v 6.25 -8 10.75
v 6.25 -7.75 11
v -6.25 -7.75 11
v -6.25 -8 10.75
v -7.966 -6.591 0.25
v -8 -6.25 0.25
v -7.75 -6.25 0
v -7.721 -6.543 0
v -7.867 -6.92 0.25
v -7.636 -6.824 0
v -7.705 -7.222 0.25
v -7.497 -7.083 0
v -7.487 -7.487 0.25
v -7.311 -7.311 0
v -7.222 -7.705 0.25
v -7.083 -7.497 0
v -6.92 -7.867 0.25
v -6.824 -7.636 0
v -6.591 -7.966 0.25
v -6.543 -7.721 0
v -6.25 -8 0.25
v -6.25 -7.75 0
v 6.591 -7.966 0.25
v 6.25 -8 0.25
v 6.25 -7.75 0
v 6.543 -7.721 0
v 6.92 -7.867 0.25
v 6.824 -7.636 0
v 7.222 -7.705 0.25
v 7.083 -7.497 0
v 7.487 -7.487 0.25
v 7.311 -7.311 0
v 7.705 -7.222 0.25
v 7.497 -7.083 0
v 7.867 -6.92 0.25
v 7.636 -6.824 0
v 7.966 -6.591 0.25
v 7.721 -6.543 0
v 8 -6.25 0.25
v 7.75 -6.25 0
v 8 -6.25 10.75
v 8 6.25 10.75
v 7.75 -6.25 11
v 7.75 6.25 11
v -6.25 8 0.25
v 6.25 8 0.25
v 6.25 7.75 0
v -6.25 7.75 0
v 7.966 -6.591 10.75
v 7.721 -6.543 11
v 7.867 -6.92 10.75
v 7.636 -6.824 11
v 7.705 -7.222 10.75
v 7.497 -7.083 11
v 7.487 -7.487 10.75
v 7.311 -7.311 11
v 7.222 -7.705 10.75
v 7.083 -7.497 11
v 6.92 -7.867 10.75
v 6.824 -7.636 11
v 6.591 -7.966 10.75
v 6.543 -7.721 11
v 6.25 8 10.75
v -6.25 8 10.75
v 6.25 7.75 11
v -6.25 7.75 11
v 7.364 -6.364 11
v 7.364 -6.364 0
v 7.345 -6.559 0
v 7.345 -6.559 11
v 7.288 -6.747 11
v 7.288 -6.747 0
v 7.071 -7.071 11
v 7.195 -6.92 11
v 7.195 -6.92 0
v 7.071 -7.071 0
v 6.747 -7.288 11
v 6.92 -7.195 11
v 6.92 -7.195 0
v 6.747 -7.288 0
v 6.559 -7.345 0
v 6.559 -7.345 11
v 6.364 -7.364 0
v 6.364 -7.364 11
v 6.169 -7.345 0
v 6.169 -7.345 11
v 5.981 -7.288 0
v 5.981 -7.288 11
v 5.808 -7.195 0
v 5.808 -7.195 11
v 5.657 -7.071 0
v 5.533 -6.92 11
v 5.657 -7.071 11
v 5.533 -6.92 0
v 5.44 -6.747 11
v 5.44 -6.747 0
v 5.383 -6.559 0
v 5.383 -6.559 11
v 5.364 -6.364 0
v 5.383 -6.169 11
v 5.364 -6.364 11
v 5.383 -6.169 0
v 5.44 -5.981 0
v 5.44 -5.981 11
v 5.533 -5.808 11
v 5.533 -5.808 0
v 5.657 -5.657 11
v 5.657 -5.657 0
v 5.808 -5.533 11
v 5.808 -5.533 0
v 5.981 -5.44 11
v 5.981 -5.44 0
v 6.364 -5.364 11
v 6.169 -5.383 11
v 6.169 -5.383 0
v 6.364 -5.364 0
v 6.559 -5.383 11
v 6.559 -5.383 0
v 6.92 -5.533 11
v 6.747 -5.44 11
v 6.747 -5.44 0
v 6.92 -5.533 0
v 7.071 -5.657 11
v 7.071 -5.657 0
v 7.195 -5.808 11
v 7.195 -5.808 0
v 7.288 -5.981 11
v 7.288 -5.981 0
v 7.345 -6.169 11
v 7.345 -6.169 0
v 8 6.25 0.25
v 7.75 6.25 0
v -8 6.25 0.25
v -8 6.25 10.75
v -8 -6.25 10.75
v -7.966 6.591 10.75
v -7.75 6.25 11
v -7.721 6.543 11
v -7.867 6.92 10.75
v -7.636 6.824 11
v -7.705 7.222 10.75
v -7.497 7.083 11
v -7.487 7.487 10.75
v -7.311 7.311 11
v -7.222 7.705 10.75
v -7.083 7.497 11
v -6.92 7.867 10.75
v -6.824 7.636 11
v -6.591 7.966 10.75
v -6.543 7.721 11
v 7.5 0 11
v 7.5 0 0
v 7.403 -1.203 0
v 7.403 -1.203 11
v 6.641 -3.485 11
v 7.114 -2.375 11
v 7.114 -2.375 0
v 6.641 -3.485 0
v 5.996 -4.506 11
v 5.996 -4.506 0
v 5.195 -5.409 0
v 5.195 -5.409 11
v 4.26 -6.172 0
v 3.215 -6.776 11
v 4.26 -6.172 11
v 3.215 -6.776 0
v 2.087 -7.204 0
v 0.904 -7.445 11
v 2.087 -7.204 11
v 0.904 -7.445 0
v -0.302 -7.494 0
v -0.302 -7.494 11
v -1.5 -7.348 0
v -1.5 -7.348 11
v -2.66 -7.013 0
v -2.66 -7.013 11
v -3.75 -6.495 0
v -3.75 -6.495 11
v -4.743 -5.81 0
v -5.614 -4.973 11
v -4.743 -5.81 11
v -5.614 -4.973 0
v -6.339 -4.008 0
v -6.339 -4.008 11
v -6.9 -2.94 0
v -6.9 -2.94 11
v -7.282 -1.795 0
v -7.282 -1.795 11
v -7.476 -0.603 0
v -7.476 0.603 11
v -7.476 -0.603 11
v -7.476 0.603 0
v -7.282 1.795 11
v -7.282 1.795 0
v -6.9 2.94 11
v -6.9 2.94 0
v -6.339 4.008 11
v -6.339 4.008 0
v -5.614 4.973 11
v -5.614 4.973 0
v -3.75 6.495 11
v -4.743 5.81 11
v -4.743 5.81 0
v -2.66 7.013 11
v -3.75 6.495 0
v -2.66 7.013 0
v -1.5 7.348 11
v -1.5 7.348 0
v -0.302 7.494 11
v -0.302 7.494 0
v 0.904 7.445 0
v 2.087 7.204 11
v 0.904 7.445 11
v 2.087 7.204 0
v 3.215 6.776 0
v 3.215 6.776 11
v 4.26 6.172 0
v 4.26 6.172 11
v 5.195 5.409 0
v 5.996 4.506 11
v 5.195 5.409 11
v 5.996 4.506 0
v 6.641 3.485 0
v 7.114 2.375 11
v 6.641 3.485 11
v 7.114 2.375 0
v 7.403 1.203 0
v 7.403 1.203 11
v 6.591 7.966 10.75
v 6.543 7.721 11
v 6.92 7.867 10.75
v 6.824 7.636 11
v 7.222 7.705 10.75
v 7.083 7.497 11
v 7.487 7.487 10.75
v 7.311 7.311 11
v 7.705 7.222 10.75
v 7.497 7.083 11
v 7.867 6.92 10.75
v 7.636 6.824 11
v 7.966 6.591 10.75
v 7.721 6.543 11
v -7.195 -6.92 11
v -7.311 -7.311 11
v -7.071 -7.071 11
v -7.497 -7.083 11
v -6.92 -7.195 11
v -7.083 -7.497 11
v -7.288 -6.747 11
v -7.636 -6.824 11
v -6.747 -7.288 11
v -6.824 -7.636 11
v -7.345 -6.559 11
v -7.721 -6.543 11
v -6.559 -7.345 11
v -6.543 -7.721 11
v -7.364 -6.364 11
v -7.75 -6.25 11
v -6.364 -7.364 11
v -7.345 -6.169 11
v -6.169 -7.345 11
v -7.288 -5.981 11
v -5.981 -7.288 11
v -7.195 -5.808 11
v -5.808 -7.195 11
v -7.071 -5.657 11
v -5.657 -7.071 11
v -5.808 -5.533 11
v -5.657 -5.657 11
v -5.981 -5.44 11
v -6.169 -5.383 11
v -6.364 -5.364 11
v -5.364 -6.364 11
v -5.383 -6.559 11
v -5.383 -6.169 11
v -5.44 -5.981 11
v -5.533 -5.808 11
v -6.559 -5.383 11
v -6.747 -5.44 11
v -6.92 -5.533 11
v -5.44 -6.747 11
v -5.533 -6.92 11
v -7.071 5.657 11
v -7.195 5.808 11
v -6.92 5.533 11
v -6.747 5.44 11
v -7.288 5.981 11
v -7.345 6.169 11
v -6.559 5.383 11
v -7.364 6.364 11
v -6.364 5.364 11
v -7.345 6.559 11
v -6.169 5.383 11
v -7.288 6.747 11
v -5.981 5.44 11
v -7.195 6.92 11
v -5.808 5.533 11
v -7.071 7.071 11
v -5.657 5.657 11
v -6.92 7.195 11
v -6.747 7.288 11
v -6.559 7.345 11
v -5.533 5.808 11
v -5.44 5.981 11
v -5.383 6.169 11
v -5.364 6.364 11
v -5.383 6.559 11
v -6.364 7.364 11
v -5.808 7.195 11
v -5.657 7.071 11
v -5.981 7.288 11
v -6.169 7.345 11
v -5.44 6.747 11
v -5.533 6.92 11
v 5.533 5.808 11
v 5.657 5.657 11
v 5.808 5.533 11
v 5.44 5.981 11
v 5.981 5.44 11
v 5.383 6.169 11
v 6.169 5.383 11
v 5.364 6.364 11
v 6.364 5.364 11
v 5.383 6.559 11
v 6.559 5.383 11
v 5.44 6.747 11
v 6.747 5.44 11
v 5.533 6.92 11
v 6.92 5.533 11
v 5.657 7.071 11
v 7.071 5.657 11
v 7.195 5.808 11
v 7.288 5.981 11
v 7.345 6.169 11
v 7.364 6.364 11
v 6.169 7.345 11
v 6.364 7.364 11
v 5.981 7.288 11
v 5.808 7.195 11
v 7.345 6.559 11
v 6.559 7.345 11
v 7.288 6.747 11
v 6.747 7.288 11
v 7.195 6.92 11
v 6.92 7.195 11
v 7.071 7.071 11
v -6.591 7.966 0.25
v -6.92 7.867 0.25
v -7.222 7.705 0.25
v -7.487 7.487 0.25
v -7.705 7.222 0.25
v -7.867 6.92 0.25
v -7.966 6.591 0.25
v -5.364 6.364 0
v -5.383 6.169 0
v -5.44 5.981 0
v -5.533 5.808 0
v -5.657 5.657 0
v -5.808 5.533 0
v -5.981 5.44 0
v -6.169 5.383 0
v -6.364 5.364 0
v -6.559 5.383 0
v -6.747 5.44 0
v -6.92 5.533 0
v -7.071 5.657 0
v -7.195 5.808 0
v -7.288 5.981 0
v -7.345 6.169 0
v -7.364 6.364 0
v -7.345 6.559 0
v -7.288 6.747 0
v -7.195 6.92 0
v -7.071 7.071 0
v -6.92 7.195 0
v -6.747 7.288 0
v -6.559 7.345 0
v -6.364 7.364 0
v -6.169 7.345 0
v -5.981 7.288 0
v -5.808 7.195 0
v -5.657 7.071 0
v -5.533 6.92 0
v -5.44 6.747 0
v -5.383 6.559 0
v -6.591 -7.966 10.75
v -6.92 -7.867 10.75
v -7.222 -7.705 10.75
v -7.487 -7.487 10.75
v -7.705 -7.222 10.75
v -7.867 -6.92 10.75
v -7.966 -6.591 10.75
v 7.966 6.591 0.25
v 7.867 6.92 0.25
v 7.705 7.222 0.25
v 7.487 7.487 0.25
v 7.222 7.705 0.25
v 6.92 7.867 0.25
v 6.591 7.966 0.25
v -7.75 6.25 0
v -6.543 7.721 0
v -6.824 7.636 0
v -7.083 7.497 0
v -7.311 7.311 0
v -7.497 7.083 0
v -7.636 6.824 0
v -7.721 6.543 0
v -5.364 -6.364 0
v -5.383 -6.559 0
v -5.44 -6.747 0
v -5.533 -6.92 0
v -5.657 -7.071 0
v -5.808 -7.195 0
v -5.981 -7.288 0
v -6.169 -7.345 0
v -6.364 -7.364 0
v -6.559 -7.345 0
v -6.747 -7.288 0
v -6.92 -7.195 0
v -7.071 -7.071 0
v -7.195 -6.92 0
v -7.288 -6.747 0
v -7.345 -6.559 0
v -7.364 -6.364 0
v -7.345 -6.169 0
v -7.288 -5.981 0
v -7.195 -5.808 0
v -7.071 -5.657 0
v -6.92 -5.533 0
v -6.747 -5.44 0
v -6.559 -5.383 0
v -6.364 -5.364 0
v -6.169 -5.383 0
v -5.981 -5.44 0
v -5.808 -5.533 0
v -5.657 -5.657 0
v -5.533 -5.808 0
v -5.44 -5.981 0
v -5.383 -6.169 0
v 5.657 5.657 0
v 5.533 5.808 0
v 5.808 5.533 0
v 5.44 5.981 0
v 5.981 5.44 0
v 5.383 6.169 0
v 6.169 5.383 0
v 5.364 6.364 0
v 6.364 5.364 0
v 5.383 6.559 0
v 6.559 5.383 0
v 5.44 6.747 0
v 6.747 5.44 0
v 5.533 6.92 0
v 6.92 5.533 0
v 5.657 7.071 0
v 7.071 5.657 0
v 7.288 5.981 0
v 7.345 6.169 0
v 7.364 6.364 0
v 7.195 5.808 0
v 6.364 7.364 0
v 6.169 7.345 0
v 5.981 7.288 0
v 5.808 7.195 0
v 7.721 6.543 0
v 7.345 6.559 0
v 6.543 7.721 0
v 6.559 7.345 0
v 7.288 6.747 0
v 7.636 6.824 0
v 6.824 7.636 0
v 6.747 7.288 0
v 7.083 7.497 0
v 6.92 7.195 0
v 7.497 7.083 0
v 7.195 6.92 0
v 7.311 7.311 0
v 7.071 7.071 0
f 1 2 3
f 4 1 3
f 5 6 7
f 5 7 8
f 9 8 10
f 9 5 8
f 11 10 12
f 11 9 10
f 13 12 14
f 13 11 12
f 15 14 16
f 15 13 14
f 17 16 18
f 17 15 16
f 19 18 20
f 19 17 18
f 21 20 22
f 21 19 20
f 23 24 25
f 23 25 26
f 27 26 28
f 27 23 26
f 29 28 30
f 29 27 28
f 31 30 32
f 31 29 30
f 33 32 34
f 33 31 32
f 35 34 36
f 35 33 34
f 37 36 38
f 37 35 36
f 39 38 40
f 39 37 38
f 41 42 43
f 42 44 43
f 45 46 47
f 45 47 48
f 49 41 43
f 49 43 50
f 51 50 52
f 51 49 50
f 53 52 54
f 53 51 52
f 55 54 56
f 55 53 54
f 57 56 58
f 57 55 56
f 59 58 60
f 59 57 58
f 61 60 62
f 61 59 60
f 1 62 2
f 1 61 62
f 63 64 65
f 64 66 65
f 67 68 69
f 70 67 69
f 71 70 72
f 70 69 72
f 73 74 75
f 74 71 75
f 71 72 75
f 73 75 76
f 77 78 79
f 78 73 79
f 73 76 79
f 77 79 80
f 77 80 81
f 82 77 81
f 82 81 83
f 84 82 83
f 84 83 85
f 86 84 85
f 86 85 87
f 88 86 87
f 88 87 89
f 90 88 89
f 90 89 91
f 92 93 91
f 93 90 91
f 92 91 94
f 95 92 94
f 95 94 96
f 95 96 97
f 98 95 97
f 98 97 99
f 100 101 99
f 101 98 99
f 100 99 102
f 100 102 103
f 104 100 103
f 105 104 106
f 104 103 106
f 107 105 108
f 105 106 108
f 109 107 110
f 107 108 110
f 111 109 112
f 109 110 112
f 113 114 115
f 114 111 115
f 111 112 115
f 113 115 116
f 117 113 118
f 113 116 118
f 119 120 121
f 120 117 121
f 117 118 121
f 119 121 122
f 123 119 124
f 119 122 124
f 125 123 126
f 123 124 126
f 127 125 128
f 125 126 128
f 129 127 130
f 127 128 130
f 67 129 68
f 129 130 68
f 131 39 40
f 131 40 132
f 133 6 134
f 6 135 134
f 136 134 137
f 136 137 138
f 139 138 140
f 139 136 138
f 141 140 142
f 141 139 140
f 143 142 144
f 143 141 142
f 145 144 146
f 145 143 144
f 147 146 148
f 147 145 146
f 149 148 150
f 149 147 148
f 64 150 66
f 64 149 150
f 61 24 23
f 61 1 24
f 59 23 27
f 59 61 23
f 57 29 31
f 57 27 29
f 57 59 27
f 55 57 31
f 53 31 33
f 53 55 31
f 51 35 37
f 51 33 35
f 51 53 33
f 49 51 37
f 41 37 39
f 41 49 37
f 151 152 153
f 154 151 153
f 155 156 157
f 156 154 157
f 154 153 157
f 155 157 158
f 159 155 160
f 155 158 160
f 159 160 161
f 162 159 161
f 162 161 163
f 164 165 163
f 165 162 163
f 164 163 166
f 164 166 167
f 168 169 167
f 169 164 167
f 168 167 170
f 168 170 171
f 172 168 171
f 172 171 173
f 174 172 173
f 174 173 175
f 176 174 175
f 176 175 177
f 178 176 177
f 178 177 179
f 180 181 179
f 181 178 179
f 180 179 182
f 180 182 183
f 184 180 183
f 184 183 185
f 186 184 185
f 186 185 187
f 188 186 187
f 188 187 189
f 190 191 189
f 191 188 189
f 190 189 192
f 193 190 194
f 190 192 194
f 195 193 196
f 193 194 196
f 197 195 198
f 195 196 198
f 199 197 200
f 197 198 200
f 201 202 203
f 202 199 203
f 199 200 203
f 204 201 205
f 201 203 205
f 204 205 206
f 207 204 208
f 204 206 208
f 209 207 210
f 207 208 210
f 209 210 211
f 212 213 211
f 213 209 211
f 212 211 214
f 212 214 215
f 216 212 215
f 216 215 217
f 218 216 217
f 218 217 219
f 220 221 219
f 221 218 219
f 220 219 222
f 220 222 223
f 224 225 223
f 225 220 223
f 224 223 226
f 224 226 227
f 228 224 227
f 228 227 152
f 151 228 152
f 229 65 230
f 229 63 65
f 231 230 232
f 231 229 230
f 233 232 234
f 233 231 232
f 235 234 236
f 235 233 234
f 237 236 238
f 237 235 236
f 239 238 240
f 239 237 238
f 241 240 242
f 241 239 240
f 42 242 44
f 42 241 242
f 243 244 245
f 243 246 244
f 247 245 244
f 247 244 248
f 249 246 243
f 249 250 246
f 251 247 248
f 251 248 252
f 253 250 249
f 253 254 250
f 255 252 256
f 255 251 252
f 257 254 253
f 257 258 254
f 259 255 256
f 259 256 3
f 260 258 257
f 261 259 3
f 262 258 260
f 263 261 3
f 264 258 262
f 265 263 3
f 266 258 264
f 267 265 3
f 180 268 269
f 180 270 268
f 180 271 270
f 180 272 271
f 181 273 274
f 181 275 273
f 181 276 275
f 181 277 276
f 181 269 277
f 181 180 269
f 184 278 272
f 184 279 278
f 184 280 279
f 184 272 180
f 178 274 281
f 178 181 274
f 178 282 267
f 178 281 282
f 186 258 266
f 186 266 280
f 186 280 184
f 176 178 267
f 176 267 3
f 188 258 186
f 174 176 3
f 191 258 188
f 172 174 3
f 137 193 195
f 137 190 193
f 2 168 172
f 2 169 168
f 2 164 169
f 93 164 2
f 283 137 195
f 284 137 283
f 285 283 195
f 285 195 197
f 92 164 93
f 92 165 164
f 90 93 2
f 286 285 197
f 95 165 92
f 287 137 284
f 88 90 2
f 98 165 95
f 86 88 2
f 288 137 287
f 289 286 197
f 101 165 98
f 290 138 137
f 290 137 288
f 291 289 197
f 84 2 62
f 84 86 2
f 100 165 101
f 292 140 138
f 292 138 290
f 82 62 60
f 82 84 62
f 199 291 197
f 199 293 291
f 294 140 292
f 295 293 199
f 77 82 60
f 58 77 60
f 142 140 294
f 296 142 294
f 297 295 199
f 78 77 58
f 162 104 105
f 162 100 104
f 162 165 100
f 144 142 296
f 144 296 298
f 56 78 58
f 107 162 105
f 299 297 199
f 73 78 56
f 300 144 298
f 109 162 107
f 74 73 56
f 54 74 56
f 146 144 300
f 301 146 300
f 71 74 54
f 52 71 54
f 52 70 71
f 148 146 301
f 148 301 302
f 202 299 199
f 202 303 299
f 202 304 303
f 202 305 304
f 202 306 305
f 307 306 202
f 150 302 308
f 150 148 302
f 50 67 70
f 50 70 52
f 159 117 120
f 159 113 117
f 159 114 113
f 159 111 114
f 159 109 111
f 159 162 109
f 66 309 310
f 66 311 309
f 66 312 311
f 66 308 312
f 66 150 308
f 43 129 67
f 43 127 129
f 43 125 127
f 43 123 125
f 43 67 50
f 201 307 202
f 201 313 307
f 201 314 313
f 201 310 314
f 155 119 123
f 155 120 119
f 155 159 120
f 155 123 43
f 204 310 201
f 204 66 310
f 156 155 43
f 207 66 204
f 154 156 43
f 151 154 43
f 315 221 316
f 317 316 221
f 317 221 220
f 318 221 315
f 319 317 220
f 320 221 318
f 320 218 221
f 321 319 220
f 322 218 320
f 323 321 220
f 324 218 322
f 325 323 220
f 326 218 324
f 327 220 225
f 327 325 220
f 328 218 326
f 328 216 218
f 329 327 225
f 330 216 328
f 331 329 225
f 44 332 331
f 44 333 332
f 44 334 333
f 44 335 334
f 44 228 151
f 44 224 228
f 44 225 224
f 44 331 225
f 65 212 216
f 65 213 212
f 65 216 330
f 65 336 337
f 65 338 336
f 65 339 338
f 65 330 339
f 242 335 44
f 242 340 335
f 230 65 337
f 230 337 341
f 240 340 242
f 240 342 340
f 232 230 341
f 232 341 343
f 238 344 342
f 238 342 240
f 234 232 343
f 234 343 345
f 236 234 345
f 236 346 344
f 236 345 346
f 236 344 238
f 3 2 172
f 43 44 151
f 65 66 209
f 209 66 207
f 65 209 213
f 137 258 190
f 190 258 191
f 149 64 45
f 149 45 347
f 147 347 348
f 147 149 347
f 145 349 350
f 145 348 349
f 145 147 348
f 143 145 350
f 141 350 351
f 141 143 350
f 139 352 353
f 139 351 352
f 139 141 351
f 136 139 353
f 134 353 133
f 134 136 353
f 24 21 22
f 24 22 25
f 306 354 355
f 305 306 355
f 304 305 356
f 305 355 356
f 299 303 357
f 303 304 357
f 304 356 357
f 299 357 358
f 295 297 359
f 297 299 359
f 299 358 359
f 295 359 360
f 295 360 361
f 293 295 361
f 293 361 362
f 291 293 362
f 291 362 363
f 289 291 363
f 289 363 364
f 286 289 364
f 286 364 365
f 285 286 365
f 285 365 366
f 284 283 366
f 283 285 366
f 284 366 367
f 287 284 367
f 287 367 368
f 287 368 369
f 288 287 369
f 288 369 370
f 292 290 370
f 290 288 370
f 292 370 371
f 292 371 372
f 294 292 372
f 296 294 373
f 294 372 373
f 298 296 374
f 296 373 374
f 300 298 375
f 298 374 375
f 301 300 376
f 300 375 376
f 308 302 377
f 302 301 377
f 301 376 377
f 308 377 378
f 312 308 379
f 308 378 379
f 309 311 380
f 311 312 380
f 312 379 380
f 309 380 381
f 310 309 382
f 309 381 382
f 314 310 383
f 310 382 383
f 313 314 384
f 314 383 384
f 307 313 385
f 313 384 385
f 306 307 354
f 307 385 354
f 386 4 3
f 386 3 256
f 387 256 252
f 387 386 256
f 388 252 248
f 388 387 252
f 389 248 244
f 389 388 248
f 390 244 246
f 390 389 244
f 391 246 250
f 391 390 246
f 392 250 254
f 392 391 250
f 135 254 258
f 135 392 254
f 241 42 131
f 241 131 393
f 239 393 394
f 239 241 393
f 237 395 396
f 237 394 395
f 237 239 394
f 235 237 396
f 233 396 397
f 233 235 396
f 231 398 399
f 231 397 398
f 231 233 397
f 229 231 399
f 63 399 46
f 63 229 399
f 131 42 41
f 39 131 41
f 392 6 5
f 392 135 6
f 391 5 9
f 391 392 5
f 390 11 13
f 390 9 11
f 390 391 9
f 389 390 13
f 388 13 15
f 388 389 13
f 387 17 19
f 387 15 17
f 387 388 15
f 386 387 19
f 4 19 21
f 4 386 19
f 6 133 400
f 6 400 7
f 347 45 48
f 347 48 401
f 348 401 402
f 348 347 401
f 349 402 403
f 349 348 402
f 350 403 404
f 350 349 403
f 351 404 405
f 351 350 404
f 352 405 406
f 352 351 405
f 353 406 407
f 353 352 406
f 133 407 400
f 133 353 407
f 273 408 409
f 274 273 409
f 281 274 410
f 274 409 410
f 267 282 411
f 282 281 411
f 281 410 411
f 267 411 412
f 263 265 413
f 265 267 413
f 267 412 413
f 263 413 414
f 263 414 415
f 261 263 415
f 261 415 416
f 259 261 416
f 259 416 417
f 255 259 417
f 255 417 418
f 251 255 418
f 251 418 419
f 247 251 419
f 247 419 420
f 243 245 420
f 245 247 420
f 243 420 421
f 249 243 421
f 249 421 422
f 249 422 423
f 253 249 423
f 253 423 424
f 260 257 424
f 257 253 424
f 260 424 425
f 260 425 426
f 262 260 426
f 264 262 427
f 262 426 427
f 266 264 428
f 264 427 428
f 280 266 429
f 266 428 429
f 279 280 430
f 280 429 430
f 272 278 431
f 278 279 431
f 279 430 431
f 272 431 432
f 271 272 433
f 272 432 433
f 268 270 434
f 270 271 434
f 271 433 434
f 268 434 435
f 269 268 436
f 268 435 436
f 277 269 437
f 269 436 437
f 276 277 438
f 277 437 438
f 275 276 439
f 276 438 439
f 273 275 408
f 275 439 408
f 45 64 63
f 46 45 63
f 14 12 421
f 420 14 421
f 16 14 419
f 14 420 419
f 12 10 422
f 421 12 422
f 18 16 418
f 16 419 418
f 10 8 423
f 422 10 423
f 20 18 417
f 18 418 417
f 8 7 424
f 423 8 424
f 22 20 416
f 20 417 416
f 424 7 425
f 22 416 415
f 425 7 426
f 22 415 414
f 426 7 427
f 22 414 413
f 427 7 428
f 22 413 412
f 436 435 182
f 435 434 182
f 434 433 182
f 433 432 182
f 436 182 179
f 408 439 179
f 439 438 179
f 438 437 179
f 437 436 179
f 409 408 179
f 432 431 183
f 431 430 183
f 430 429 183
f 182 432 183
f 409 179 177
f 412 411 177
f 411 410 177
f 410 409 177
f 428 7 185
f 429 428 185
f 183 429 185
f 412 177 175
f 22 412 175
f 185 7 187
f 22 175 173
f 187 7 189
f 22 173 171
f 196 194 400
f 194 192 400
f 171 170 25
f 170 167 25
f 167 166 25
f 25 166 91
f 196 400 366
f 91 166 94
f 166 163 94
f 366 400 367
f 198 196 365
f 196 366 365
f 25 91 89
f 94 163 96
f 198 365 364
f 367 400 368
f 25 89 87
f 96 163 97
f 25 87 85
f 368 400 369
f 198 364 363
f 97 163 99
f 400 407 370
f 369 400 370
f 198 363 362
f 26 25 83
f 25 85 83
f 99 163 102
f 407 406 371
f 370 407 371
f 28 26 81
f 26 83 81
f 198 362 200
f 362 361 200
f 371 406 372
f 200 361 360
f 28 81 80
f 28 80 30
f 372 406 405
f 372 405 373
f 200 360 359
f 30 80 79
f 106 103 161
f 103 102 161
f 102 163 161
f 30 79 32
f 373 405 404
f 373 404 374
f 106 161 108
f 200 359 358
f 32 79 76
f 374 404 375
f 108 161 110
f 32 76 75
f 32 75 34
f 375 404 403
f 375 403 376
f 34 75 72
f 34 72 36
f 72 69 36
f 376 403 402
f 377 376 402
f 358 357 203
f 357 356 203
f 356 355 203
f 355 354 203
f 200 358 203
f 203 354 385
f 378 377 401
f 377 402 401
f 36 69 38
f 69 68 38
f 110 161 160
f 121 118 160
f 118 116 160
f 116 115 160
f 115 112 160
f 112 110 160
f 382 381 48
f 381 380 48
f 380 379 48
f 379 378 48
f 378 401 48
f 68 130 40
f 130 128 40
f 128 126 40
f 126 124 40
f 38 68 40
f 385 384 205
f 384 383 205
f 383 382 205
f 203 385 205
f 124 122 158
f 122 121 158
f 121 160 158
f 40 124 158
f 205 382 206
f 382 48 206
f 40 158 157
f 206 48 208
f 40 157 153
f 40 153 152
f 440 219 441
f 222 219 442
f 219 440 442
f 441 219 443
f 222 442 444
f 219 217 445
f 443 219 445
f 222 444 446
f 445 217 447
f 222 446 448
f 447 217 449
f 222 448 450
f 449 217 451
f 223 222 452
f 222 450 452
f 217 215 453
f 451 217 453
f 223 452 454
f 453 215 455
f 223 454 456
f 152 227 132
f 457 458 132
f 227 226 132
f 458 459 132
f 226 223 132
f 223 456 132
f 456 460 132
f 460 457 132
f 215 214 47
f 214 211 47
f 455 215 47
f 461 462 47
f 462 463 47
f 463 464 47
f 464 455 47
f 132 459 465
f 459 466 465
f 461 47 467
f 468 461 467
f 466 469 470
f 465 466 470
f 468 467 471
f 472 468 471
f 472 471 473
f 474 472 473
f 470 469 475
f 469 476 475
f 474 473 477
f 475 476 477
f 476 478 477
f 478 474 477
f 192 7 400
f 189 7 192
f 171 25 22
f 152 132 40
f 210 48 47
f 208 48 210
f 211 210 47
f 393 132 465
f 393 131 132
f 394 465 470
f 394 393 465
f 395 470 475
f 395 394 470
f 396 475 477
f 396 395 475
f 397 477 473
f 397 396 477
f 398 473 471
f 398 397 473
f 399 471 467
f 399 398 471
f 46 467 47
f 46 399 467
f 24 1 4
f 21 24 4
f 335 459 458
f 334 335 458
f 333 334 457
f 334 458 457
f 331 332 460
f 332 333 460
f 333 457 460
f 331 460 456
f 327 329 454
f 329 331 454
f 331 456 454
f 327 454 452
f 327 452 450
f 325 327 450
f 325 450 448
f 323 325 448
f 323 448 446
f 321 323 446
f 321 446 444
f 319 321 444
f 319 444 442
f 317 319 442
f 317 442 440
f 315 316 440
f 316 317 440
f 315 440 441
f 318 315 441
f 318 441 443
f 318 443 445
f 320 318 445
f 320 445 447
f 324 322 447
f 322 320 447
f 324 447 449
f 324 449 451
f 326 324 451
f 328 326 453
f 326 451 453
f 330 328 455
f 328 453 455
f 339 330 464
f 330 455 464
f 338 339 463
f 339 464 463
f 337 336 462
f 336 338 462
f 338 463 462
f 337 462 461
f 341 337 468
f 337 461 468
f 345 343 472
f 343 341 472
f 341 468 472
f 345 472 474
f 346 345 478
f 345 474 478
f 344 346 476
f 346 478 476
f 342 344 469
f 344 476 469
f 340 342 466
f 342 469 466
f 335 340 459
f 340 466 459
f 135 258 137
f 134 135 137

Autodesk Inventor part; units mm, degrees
ref_plane "YZ Plane" through (0, 0, 0) normal (1, 0, 0) x (0, 1, 0)
ref_plane "XZ Plane" through (0, 0, 0) normal (0, 1, 0) x (-1, 0, 0)
ref_plane "XY Plane" through (0, 0, 0) normal (0, 0, 1) x (1, 0, 0)
sketch "Sketch1" plane through (0, 0, 0) normal (0, 0, 1) x (1, 0, 0)
  circle A0 centre (0, 0) radius 11
  circle A1 centre (0, 0) radius 9 construction
  line L0 (0, 0) -> (0, 11) construction
  line L1 (0, 0) -> (-6.364, 6.364) construction
  circle A2 centre (-6.364, 6.364) radius 1
  circle A3 centre (0, 0) radius 7.5
  circle A4 centre (-6.364, -6.364) radius 1
  circle A5 centre (6.364, -6.364) radius 1
  circle A6 centre (6.364, 6.364) radius 1
  dimension "d0" = 22
  dimension "d1" = 18
  dimension "d2" = 45
  dimension "d3" = 2
  dimension "d4" = 15
  dimension "d7" = 360
extrude "Extrusion1" add sketch "Sketch1" along normal blind 11
chamfer "Chamfer1" [suppressed]
chamfer "Chamfer2" [suppressed]
sketch "Sketch2" plane through (0, 0, 11) normal (0, 0, 1) x (1, 0, 0)
  line L0 (8, -8) -> (-8, -8)
  line L1 (-8, -8) -> (-8, 8)
  line L2 (-8, 8) -> (8, 8)
  line L3 (8, 8) -> (8, -8)
  line L4 (8, -8) -> (-8, 8) construction
  line L5 (-8, -8) -> (8, 8) construction
  circle A0 centre (0, 0) radius 15
  arc A1 (-6.25, 8) -> (-8, 6.25) centre (-6.25, 6.25) ccw
  arc A2 (-8, -6.25) -> (-6.25, -8) centre (-6.25, -6.25) ccw
  arc A3 (6.25, -8) -> (8, -6.25) centre (6.25, -6.25) ccw
  arc A4 (8, 6.25) -> (6.25, 8) centre (6.25, 6.25) ccw
  point P0 (8, 6.25)
  point P1 (8, -6.25)
  point P2 (6.25, -8)
  point P3 (-6.25, -8)
  point P4 (-8, -6.25)
  point P5 (6.25, 8)
  dimension "d11" = 16
  dimension "d12" = 16
  dimension "d13" = 30
  dimension "d14" = 3.5
  dimension "d17" = 360
extrude "Extrusion2" cut sketch "Sketch2" against normal through all contours L0 A3 L3 | L0 L1 A2 | A4 L2 L3 | L1 L2 A1 | A0
chamfer "Chamfer3" distance 0.25 angle 45 16 edges at (8, 0, 11) (7.4874, 7.4874, 11) (0, 8, 11) (-7.4874, 7.4874, 11) (-8, 0, 11) (-7.4874, -7.4874, 11) (0, -8, 11) (7.4874, -7.4874, 11) (8, 0, 0) (7.4874, -7.4874, 0) (0, -8, 0) (-7.4874, -7.4874, 0) (-8, 0, 0) (-7.4874, 7.4874, 0) (0, 8, 0) (7.4874, 7.4874, 0)
properties part number "AL Ring" material "Aluminum 6061"
